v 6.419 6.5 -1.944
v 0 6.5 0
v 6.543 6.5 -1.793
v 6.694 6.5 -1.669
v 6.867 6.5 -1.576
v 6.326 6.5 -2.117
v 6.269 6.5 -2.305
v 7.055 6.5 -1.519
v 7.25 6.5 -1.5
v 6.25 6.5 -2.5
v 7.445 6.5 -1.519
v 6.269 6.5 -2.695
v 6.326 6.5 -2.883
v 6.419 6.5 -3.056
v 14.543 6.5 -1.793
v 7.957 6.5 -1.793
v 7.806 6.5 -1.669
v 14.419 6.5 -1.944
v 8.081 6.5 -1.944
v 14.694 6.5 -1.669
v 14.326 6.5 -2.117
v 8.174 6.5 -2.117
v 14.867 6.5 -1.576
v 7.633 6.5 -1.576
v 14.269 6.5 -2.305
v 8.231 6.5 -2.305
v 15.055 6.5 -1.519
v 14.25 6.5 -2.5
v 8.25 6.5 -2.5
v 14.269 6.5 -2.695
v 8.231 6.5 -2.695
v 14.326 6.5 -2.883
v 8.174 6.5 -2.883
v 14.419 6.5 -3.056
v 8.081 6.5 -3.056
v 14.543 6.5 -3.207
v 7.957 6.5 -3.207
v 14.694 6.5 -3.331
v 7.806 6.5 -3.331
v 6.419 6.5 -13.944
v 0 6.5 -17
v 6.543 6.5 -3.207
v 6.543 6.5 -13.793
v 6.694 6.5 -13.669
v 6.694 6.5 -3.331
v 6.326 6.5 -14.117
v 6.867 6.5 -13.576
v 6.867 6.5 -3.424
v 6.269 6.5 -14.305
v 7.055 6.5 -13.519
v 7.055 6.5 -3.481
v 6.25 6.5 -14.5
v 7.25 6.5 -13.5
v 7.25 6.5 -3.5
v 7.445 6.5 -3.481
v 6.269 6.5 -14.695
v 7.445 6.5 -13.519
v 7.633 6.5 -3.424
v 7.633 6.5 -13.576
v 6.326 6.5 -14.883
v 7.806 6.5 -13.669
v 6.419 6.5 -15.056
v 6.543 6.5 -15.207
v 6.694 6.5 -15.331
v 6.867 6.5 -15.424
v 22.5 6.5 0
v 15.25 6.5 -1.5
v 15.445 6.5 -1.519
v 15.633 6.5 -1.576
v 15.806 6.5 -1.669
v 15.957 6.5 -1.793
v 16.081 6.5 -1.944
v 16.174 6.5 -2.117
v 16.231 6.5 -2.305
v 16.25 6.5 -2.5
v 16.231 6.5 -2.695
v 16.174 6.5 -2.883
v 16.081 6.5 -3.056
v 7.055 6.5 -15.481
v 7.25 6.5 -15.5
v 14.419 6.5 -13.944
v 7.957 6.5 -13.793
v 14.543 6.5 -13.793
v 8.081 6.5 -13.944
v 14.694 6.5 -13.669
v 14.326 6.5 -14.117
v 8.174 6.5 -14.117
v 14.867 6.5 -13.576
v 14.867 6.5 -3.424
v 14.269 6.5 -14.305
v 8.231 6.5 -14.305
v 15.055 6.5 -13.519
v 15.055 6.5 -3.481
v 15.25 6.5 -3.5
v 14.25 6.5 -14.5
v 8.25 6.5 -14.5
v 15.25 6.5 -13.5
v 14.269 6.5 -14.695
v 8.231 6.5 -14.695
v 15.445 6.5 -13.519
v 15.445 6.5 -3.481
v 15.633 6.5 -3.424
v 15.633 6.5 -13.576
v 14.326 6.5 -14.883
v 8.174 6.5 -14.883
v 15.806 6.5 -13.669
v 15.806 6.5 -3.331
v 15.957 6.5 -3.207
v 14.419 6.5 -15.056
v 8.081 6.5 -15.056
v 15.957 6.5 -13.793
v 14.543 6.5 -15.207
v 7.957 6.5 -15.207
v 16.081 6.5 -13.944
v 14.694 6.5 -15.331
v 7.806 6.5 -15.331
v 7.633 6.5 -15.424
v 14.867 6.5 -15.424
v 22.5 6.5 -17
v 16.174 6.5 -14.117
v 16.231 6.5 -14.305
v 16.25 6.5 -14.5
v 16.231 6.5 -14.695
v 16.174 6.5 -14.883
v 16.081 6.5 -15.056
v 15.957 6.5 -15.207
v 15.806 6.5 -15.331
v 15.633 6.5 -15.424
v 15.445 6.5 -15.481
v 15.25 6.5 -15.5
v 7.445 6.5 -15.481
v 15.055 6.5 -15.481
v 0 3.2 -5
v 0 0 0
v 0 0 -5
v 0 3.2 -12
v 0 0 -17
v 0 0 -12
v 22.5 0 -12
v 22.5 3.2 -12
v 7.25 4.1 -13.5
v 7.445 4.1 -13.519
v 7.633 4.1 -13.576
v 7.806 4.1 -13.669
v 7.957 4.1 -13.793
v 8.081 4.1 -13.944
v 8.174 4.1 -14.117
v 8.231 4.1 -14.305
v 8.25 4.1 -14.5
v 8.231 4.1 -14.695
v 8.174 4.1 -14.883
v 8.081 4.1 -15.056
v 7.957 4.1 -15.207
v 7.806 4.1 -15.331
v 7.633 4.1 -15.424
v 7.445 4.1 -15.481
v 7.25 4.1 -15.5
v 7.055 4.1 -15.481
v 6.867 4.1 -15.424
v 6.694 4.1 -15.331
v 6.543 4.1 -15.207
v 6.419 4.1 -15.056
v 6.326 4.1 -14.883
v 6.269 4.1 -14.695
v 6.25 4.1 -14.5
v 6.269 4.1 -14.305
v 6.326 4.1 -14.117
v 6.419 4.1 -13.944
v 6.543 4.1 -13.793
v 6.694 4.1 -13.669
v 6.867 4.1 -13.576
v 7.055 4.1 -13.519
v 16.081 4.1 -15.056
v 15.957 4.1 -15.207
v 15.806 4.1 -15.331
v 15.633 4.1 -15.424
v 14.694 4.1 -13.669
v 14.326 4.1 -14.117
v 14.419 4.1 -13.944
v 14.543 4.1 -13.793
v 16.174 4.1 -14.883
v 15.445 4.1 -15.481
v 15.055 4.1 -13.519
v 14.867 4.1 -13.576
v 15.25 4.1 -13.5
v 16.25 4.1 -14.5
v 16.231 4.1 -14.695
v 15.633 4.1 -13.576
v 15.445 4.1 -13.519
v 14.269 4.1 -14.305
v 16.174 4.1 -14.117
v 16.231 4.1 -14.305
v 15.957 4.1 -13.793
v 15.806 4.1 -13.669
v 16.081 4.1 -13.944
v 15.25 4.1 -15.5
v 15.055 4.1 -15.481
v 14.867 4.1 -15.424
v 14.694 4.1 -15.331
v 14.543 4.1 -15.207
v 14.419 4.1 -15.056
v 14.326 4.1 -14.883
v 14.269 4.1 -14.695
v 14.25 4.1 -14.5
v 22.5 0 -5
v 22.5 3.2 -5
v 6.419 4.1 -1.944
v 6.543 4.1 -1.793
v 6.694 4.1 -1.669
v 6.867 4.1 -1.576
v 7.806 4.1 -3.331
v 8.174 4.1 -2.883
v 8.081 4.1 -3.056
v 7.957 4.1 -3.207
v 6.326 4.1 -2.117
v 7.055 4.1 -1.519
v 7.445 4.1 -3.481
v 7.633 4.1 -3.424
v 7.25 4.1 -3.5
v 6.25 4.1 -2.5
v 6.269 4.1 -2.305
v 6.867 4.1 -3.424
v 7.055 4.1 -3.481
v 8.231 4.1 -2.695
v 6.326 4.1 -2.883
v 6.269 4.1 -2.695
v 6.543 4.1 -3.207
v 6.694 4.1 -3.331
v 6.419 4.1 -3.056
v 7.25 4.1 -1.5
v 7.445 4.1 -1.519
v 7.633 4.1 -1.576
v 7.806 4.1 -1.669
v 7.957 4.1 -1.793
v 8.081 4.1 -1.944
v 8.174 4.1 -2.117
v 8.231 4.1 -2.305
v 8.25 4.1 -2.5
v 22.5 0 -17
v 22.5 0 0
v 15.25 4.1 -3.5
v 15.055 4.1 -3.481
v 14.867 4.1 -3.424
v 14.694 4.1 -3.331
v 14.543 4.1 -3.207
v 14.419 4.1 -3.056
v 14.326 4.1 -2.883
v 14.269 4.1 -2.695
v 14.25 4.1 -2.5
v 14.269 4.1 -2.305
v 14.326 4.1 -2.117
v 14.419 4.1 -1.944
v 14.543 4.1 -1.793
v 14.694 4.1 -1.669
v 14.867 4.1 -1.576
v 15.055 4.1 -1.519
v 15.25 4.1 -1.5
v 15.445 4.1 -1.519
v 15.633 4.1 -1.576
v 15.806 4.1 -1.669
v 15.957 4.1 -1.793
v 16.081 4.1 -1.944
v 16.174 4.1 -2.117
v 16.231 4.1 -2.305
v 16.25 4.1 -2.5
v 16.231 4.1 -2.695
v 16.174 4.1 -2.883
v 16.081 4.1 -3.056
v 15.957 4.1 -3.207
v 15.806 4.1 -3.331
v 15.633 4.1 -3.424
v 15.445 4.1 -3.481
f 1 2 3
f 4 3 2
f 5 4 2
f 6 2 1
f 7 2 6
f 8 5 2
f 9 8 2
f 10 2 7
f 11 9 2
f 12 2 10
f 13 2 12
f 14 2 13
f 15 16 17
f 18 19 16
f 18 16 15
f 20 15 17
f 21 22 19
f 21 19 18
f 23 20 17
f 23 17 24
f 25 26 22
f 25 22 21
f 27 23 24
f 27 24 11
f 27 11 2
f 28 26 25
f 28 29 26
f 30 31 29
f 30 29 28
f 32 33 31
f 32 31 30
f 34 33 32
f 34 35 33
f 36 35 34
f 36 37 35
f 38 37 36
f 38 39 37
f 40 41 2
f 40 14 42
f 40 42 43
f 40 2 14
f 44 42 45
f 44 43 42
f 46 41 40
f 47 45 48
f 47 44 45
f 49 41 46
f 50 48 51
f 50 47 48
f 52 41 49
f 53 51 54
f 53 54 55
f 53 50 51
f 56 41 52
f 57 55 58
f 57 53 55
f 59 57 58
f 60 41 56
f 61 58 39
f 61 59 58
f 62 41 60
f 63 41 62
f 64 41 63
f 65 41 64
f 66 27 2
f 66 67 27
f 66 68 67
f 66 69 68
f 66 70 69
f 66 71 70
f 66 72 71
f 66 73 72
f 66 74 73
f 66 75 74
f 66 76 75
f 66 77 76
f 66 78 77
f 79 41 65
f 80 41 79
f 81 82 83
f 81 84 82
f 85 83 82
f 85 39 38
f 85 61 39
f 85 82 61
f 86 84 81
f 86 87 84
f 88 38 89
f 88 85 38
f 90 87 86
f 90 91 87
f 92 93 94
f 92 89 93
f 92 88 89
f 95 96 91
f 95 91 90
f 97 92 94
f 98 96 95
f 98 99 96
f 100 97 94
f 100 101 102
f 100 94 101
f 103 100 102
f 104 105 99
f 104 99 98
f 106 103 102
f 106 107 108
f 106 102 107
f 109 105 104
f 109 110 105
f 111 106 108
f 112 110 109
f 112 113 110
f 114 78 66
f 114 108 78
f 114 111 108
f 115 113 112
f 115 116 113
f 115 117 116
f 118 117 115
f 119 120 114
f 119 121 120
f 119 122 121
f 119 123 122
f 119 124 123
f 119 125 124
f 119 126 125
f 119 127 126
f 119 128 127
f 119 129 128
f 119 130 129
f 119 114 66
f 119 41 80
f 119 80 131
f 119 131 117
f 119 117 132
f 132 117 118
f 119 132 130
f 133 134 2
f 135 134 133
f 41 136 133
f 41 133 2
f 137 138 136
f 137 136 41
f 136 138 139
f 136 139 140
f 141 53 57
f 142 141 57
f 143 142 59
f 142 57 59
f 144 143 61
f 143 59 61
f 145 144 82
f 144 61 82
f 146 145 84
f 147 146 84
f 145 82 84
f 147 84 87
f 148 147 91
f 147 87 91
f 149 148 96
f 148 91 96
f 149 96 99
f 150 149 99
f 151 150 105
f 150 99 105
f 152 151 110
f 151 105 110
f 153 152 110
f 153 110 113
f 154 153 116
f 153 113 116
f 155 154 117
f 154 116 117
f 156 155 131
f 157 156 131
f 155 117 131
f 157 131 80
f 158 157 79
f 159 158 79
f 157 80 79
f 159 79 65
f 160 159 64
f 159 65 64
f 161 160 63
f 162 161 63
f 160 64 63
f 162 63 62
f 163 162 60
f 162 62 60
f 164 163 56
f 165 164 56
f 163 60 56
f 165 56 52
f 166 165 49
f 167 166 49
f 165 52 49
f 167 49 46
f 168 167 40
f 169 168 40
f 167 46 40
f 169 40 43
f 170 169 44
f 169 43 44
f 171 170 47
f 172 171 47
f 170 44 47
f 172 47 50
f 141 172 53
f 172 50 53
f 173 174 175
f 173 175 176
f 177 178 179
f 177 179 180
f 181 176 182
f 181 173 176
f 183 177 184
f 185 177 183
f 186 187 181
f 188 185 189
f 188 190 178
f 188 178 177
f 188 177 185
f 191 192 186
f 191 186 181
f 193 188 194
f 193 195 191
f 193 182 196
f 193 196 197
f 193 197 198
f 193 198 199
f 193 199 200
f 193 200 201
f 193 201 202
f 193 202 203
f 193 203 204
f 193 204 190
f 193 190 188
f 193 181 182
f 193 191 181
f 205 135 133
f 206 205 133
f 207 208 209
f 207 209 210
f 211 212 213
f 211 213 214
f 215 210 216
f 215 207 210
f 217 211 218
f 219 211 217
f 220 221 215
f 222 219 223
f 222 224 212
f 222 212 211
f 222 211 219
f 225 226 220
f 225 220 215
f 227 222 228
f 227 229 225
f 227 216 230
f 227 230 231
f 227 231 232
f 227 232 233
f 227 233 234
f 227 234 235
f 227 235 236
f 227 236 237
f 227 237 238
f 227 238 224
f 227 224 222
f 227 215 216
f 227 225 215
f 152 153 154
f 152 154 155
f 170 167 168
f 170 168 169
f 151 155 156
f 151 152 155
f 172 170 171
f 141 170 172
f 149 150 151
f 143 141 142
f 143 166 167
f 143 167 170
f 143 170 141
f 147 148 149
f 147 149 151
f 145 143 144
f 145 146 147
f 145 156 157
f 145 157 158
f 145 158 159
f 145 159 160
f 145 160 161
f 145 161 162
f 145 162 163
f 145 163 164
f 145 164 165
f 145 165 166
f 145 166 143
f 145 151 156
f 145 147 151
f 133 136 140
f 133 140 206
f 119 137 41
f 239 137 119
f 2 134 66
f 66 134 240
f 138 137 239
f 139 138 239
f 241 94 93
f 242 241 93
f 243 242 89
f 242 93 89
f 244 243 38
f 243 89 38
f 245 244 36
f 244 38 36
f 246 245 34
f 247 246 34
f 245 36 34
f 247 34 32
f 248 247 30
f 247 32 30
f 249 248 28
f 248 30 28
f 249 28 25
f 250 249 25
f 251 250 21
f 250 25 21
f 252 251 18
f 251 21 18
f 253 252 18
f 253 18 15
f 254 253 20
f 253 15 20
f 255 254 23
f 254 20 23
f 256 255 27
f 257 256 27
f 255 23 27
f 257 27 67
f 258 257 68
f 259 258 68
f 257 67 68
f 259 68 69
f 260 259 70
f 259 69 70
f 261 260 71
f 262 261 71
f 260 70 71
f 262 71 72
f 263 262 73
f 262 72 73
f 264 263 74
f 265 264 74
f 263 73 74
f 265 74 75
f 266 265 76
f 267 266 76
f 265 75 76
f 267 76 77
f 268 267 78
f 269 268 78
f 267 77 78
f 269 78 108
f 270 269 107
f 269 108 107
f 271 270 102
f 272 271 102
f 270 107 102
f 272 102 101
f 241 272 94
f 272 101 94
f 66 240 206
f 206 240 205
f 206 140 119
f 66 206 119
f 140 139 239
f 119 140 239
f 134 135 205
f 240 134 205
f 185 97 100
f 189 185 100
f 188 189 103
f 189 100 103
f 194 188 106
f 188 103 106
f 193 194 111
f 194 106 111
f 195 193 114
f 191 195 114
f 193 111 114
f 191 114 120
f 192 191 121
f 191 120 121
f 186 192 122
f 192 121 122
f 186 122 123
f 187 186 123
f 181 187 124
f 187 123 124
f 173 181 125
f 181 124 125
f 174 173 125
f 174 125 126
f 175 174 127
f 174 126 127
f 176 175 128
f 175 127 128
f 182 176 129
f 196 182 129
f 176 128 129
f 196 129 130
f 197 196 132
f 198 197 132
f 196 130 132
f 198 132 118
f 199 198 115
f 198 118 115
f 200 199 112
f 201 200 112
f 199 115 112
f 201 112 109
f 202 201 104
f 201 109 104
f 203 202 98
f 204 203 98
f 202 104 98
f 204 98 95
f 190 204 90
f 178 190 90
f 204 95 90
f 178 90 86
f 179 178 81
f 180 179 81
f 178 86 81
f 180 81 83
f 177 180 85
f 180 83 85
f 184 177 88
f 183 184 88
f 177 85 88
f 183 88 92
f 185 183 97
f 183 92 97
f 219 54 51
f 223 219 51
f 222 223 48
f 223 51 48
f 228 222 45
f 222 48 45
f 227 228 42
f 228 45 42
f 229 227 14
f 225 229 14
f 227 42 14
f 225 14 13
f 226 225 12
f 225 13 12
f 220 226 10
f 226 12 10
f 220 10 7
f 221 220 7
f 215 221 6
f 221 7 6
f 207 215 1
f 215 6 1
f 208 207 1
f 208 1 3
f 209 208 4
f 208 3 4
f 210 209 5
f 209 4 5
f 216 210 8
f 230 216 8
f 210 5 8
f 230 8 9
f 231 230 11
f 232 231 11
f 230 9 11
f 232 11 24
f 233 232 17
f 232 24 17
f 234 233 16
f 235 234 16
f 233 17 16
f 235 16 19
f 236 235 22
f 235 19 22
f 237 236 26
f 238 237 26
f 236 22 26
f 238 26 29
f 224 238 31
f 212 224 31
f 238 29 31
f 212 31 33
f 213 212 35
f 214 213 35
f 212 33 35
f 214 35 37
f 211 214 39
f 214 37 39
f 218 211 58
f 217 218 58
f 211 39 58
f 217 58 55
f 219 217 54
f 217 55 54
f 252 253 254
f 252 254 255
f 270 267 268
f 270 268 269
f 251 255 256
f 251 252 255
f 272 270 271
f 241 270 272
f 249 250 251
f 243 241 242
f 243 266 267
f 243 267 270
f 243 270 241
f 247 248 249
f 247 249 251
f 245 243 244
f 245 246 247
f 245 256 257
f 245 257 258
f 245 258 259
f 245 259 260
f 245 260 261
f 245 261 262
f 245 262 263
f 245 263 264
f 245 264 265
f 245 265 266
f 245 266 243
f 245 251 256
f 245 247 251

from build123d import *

# Parameters (mm, degrees)
SKETCH_1_W          = 22.5
SKETCH_1_H          = 17
EXTRUDE_1_DEPTH     = 6.5
SKETCH_2_W          = 7
SKETCH_2_H          = 3.2
CUT_EXTRUDE_1_DEPTH = 29.939592257
SKETCH_3_R          = 1
CUT_EXTRUDE_2_DEPTH = 2.4


with BuildPart() as part:
    # 草图1 → 凸台-拉伸1 (new body)
    with BuildSketch(Plane(origin=(0, 0, 0), x_dir=(1, 0, 0), z_dir=(0, 1, 0))):
        with Locations((11.25, 8.5)):
            Rectangle(SKETCH_1_W, SKETCH_1_H)
    extrude(amount=EXTRUDE_1_DEPTH)

    # 草图2 → 切除-拉伸1 (cut, through all)
    with BuildSketch(Plane.ZY):
        with Locations((-8.5, 1.6)):
            Rectangle(SKETCH_2_W, SKETCH_2_H)
    extrude(amount=-CUT_EXTRUDE_1_DEPTH, mode=Mode.SUBTRACT)

    # 草图3 → 切除-拉伸2 (cut)
    with BuildSketch(Plane(origin=(0, 6.5, 0), x_dir=(1, 0, 0), z_dir=(0, 1, 0))):
        with Locations(Location((7.25, 14.5, 0), (0, 0, 270))):
            Circle(SKETCH_3_R)
        with Locations(Location((15.25, 14.5, 0), (0, 0, 270))):
            Circle(SKETCH_3_R)
        with Locations(Location((15.25, 2.5, 0), (0, 0, 90))):
            Circle(SKETCH_3_R)
        with Locations(Location((7.25, 2.5, 0), (0, 0, 90))):
            Circle(SKETCH_3_R)
    extrude(amount=-CUT_EXTRUDE_2_DEPTH, mode=Mode.SUBTRACT)


solid = part.part
